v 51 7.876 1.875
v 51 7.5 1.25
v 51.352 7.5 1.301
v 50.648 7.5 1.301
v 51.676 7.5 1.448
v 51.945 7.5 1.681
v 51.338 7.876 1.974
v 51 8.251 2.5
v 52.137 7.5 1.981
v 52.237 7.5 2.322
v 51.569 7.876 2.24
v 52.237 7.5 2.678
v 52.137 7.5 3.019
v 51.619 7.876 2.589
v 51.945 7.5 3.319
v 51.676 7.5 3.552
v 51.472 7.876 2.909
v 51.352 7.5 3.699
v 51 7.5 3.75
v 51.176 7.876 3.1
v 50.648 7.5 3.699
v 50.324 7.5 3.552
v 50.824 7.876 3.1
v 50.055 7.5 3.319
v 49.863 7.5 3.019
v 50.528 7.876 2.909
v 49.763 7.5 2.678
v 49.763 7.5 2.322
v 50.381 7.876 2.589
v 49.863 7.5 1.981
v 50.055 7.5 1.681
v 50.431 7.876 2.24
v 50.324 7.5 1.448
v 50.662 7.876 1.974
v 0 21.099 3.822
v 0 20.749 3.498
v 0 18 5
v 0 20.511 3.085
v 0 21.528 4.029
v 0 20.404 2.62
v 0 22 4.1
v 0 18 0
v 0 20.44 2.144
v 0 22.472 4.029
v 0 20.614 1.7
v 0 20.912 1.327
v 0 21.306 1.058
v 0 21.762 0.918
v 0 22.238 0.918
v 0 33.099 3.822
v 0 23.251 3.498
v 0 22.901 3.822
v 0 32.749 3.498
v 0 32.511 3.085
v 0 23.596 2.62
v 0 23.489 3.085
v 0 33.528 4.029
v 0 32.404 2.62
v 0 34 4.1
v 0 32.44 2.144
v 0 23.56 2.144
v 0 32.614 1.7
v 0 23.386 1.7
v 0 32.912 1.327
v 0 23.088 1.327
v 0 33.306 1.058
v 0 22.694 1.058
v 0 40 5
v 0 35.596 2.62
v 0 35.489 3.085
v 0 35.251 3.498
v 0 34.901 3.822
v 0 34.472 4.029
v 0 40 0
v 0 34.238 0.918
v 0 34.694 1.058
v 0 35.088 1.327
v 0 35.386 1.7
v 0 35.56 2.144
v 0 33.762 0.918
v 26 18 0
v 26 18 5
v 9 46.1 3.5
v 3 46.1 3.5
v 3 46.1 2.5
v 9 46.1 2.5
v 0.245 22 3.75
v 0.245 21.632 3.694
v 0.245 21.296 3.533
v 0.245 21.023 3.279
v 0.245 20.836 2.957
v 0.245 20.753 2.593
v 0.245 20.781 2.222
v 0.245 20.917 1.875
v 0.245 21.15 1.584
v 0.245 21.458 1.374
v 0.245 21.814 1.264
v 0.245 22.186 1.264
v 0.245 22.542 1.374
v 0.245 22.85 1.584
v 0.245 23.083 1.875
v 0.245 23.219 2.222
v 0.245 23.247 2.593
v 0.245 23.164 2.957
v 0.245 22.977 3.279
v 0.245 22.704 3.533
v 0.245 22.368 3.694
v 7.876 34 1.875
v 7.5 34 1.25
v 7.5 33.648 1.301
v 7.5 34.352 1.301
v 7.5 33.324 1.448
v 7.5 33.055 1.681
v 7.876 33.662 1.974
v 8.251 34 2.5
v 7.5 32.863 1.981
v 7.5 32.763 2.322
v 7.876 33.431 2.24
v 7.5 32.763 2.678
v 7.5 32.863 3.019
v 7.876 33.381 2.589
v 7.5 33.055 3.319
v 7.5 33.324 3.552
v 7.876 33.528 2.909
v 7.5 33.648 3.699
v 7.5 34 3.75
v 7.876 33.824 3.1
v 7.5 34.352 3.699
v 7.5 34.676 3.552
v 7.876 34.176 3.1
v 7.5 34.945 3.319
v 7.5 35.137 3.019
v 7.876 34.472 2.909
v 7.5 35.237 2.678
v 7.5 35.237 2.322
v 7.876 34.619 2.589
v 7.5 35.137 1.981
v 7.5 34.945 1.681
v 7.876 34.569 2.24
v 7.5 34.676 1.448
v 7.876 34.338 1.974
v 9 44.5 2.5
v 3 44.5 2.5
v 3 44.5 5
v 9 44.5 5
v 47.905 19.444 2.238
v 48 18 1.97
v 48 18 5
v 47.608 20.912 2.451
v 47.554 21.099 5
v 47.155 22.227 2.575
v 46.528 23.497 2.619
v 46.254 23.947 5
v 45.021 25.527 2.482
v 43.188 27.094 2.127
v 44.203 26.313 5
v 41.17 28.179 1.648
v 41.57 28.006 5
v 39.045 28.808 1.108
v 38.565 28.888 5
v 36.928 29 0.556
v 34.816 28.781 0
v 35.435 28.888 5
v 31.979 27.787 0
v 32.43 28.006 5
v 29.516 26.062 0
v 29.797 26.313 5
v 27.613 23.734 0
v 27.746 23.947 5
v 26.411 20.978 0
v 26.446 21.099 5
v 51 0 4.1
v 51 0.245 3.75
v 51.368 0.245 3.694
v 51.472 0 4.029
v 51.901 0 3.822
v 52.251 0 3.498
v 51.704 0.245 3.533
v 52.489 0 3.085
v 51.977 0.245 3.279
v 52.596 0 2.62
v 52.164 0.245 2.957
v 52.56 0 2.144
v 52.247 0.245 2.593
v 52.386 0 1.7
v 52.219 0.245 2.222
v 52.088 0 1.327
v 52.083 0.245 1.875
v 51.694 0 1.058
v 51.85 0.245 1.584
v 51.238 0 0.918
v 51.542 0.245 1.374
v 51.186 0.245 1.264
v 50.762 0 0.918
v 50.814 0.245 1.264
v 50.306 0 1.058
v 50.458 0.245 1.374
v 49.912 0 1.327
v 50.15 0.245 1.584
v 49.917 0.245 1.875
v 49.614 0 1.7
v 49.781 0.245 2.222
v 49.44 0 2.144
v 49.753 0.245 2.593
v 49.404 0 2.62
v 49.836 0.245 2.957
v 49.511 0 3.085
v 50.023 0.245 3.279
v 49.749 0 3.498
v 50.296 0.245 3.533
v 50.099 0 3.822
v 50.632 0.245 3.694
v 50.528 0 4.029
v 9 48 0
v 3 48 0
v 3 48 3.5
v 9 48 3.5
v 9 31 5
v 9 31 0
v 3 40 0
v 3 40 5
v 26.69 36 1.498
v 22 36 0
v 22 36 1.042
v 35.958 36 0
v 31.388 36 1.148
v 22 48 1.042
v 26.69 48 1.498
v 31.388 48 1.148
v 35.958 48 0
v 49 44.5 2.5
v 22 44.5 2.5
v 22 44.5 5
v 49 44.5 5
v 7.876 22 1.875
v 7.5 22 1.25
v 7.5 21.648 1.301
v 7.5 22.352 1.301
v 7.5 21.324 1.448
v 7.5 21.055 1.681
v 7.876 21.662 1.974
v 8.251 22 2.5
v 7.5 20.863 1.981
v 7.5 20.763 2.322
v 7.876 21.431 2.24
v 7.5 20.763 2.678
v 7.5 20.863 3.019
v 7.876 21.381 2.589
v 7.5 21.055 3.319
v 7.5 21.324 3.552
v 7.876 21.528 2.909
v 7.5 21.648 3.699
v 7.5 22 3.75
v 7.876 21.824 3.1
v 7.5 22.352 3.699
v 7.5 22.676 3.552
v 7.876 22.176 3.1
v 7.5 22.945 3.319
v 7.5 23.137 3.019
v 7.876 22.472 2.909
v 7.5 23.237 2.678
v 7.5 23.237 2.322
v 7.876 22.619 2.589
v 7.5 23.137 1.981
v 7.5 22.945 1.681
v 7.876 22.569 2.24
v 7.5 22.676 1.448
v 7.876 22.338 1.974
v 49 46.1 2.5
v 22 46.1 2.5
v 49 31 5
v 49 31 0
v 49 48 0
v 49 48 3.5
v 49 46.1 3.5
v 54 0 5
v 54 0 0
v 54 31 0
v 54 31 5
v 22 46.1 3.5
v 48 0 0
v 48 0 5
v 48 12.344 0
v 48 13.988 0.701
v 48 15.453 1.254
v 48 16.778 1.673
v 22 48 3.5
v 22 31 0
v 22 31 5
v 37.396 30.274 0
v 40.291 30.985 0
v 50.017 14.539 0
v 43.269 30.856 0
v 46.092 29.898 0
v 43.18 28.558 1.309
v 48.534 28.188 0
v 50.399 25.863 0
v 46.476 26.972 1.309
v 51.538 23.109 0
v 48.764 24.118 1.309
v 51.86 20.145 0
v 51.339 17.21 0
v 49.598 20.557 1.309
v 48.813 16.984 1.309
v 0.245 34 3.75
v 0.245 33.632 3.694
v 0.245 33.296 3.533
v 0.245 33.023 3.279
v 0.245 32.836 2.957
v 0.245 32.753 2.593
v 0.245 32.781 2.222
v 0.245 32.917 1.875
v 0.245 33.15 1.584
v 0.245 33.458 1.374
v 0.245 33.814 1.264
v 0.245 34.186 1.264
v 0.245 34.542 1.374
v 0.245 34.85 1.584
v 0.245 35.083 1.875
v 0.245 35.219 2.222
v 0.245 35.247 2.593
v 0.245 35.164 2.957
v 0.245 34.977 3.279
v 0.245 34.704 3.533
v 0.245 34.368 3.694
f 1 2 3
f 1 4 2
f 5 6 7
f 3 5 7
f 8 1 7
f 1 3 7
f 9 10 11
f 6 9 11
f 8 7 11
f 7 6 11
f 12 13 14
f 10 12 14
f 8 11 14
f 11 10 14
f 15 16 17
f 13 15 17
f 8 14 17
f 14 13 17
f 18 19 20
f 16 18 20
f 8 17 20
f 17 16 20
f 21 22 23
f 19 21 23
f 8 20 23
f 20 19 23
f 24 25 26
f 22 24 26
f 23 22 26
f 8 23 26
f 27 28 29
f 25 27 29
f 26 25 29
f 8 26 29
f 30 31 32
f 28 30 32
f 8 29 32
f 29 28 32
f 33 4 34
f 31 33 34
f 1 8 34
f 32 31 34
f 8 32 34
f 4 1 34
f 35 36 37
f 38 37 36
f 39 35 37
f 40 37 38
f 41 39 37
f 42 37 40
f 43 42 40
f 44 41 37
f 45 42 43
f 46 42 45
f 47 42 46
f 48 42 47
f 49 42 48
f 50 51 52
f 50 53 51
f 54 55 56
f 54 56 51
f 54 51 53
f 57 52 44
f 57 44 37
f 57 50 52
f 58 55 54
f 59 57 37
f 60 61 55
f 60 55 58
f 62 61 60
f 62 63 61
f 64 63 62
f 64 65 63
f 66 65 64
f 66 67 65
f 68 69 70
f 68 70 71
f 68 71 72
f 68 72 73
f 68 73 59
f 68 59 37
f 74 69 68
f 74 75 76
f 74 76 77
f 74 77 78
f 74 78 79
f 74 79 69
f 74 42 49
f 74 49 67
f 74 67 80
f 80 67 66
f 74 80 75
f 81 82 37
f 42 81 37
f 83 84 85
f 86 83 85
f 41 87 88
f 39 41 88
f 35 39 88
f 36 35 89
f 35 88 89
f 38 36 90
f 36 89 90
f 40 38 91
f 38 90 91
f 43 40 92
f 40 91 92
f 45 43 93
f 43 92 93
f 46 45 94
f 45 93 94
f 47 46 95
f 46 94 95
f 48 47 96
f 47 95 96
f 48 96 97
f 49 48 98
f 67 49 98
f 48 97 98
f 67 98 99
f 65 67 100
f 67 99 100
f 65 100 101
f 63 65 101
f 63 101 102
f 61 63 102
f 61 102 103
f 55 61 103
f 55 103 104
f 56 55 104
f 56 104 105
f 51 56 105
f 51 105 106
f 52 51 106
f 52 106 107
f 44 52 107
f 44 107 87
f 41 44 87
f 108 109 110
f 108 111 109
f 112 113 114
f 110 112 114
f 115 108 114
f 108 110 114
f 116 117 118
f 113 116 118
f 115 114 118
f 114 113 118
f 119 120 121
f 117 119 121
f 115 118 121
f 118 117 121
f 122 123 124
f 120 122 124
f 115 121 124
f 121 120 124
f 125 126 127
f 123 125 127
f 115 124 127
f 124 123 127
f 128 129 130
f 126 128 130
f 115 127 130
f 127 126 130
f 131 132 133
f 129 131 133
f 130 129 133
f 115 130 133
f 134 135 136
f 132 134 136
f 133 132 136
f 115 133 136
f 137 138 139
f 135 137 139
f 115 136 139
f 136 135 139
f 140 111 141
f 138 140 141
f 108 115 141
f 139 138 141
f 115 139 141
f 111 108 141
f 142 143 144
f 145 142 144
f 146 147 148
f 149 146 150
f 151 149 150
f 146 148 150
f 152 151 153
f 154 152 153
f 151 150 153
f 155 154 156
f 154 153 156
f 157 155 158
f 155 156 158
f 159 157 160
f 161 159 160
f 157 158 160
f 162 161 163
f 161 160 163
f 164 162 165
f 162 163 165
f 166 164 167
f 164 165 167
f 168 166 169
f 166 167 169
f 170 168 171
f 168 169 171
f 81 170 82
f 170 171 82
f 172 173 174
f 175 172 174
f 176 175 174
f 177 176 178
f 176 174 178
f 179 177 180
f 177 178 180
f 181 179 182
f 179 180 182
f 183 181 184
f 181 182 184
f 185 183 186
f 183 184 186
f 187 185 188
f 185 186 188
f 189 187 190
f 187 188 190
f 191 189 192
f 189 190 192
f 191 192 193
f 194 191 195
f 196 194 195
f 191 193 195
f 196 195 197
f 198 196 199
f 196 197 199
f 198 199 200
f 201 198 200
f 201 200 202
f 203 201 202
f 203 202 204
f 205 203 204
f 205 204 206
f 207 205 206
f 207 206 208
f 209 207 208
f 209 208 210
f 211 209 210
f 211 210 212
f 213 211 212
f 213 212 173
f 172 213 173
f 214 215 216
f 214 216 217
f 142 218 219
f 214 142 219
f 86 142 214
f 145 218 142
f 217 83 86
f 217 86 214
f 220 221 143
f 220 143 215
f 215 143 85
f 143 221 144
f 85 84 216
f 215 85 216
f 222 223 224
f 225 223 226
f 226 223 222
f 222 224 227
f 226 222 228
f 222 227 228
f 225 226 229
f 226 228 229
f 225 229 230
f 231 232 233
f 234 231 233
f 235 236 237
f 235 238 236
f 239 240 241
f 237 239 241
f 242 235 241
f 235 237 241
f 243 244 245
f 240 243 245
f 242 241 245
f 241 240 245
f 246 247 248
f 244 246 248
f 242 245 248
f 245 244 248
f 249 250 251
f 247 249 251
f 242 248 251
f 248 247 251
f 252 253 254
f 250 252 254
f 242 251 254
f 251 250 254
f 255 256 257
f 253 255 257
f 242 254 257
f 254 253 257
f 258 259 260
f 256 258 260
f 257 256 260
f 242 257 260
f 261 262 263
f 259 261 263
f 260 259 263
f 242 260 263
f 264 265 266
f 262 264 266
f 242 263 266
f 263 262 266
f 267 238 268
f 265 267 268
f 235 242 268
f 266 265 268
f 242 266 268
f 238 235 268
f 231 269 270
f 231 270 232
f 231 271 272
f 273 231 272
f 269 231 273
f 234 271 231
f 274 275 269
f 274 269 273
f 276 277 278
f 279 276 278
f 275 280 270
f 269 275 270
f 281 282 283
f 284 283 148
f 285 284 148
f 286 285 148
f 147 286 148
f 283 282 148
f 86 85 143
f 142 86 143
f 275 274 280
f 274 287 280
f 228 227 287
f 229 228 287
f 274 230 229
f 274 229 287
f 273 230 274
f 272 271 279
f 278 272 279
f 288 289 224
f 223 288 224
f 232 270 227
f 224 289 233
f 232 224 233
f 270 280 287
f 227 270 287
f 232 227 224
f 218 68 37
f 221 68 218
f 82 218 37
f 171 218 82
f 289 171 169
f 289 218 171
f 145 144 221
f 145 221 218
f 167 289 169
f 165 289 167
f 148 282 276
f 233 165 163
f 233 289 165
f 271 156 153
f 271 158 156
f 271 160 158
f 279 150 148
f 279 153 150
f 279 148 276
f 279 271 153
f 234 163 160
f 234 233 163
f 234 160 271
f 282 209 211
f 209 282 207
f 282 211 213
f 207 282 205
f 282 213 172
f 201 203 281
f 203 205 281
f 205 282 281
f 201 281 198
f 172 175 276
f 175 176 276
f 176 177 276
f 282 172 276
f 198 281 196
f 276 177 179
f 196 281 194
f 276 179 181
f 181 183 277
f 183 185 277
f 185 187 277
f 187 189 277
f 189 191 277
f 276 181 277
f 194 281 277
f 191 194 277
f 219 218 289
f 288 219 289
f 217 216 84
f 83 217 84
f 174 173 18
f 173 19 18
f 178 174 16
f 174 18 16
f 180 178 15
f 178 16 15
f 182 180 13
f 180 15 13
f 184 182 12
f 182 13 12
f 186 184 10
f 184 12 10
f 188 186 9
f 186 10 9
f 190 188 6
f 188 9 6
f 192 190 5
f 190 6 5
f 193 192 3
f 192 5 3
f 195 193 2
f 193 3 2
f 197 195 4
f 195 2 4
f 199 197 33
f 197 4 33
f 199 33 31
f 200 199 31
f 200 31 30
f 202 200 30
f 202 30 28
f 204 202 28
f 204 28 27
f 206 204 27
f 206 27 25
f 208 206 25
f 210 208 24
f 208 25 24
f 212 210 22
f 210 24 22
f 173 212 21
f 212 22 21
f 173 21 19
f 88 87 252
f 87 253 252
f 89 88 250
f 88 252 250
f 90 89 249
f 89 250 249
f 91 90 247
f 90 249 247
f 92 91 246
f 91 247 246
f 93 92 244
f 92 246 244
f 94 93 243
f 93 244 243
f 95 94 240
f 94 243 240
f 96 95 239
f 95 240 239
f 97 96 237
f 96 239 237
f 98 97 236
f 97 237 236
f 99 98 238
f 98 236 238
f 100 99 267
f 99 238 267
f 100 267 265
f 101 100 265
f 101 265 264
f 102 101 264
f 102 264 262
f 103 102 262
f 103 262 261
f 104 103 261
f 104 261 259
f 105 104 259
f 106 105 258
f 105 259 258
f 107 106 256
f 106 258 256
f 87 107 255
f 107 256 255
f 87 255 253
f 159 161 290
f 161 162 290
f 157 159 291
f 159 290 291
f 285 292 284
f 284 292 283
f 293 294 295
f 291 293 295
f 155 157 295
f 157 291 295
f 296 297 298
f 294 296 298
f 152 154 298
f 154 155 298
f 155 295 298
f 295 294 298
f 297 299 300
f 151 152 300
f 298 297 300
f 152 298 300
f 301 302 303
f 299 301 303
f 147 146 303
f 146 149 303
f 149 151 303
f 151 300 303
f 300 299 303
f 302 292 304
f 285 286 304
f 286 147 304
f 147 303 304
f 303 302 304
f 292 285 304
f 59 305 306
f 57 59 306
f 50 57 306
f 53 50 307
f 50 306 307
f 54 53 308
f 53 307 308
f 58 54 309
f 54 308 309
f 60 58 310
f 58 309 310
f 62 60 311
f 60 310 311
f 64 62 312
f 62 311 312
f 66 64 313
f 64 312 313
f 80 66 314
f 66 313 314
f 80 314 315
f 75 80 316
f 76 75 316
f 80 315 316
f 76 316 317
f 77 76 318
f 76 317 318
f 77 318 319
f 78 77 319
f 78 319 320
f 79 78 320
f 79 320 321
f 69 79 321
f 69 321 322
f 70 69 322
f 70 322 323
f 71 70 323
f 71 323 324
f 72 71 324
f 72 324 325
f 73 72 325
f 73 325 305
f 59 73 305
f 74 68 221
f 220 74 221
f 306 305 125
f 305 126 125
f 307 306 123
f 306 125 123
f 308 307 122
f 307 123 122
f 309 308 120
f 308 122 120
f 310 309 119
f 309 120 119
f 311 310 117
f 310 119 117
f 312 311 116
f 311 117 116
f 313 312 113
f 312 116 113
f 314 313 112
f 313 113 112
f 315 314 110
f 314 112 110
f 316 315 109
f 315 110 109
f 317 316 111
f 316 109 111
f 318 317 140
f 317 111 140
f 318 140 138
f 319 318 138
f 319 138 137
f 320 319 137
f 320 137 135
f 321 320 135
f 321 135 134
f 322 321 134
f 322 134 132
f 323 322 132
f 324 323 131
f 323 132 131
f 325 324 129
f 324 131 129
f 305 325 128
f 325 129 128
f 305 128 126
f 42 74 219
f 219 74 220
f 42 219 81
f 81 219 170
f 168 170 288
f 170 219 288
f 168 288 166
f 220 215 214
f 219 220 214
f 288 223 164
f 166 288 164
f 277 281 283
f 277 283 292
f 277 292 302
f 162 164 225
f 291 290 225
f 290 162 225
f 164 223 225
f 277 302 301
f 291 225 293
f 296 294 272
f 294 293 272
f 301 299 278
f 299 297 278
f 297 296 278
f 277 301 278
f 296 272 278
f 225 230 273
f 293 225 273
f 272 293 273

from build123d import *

# Parameters (mm, degrees)
SKETCH_1_W                            = 54
SKETCH_1_H                            = 48
EXTRUDE_1_DEPTH                       = 5
SKETCH_3_W                            = 3
SKETCH_3_H                            = 8
SKETCH_3_W_2                          = 13
SKETCH_3_H_2                          = 17
SKETCH_3_W_3                          = 5
CUT_EXTRUDE_1_DEPTH                   = 6
CUT_EXTRUDE_2_DEPTH                   = 55
CUT_EXTRUDE_3_DEPTH                   = 6
CUT_EXTRUDE_4_DEPTH                   = 12
HOLE_WIZARD_M31_D                     = 2.5
HOLE_WIZARD_M31_DEPTH                 = 7.5
HOLE_WIZARD_M31_CSINK_D               = 3.2
HOLE_WIZARD_M31_CSINK_ANGLE           = 110
HOLE_WIZARD_M31_TIP                   = 0.751075774
HOLE_WIZARD_M31_ON_FACE_2_D           = 2.5
HOLE_WIZARD_M31_ON_FACE_2_DEPTH       = 7.5
HOLE_WIZARD_M31_ON_FACE_2_CSINK_D     = 3.2
HOLE_WIZARD_M31_ON_FACE_2_CSINK_ANGLE = 110
HOLE_WIZARD_M31_ON_FACE_2_TIP         = 0.751075774


with BuildPart() as part:
    # Эскиз1 → Бобышка-Вытянуть1 (new body)
    with BuildSketch(Plane.XY):
        with Locations((27, 24)):
            Rectangle(SKETCH_1_W, SKETCH_1_H)
    extrude(amount=EXTRUDE_1_DEPTH)

    # Эскиз3 → Вырез-Вытянуть1 (cut, through all)
    with BuildSketch(Plane.XY.offset(5)):
        with Locations((1.5, 44)):
            Rectangle(SKETCH_3_W, SKETCH_3_H)
        with Locations((15.5, 39.5)):
            Rectangle(SKETCH_3_W_2, SKETCH_3_H_2)
        with Locations((51.5, 39.5)):
            Rectangle(SKETCH_3_W_3, SKETCH_3_H_2)
    extrude(amount=-CUT_EXTRUDE_1_DEPTH, mode=Mode.SUBTRACT)

    # Эскиз4 → Вырез-Вытянуть2 (cut, through all)
    with BuildSketch(Plane.ZY):
        Polygon((3.5, 154.254870007), (3.5, 48), (3.5, 46.1), (2.5, 46.1), (2.5, 44.5), (5, 44.5), (111.254870007, 44.5), (262.897242217, 193.3790803), (155.14237221, 303.133950307), align=None)
    extrude(amount=-CUT_EXTRUDE_2_DEPTH, mode=Mode.SUBTRACT)

    # Эскиз5 → Вырез-Вытянуть3 (cut, through all)
    with BuildSketch(Plane.XY.offset(5)):
        with BuildLine():
            Line((48, -145.764501988), (48, 0))
            Line((48, 0), (48, 18))
            ThreePointArc((48, 18), (37, 29), (26, 18))
            Line((26, 18), (0, 18))
            Line((0, 18), (-145.764501988, 18))
            Line((-145.764501988, 18), (-333.948083842, -204.656910244))
            Line((-333.948083842, -204.656910244), (-140.183581854, -368.421412232))
            Line((-140.183581854, -368.421412232), (48, -145.764501988))
        make_face()
    extrude(amount=-CUT_EXTRUDE_3_DEPTH, mode=Mode.SUBTRACT)

    # Эскиз6 → Вырез-Вытянуть4 (cut)
    with BuildSketch(Plane(origin=(0, 48, 0), x_dir=(1, 0, 0), z_dir=(0, 1, 0))):
        with BuildLine():
            ThreePointArc((35.958236434, 0), (49.389746559, 10.032869731), (54.5, 26))
            ThreePointArc((54.5, 26), (4.610253441, 41.967130269), (35.958236434, 0))
        make_face()
    extrude(amount=-CUT_EXTRUDE_4_DEPTH, mode=Mode.SUBTRACT)

    # Отверстие обработанное метчиком M31
    with Locations(Plane(origin=(0, 22, 2.5), x_dir=(0, 0, -1), z_dir=(-1, 0, 0))):
        with Locations((0, 0), (0, -12)):
            CounterSinkHole(HOLE_WIZARD_M31_D / 2, HOLE_WIZARD_M31_CSINK_D / 2, depth=HOLE_WIZARD_M31_DEPTH, counter_sink_angle=HOLE_WIZARD_M31_CSINK_ANGLE)
            with Locations((0, 0, -(HOLE_WIZARD_M31_DEPTH + HOLE_WIZARD_M31_TIP / 2))):  # 118° drill point
                Cone(0, HOLE_WIZARD_M31_D / 2, HOLE_WIZARD_M31_TIP, mode=Mode.SUBTRACT)

    # Отверстие обработанное метчиком M31 on face 2
    with Locations(Plane(origin=(51, 0, 2.5), x_dir=(0, 0, -1), z_dir=(0, -1, 0))):
        with Locations((0, 0)):
            CounterSinkHole(HOLE_WIZARD_M31_ON_FACE_2_D / 2, HOLE_WIZARD_M31_ON_FACE_2_CSINK_D / 2, depth=HOLE_WIZARD_M31_ON_FACE_2_DEPTH, counter_sink_angle=HOLE_WIZARD_M31_ON_FACE_2_CSINK_ANGLE)
            with Locations((0, 0, -(HOLE_WIZARD_M31_ON_FACE_2_DEPTH + HOLE_WIZARD_M31_ON_FACE_2_TIP / 2))):  # 118° drill point
                Cone(0, HOLE_WIZARD_M31_ON_FACE_2_D / 2, HOLE_WIZARD_M31_ON_FACE_2_TIP, mode=Mode.SUBTRACT)

    # Эскиз10 → Вырез-Повернуть1 (revolve, cut)
    with BuildSketch(Plane(origin=(1.455771366, -2.52146997, 0), x_dir=(0, 0, -1), z_dir=(-0.5, 0.866025404, 0))):
        Polygon((-6.082903769, -46.04293994), (2, -60.04293994), (2, -46.04293994), align=None)
    revolve(axis=Axis((41.330127019, 20.5, 5.306460427), (0, 0, -1)), mode=Mode.SUBTRACT)


solid = part.part
